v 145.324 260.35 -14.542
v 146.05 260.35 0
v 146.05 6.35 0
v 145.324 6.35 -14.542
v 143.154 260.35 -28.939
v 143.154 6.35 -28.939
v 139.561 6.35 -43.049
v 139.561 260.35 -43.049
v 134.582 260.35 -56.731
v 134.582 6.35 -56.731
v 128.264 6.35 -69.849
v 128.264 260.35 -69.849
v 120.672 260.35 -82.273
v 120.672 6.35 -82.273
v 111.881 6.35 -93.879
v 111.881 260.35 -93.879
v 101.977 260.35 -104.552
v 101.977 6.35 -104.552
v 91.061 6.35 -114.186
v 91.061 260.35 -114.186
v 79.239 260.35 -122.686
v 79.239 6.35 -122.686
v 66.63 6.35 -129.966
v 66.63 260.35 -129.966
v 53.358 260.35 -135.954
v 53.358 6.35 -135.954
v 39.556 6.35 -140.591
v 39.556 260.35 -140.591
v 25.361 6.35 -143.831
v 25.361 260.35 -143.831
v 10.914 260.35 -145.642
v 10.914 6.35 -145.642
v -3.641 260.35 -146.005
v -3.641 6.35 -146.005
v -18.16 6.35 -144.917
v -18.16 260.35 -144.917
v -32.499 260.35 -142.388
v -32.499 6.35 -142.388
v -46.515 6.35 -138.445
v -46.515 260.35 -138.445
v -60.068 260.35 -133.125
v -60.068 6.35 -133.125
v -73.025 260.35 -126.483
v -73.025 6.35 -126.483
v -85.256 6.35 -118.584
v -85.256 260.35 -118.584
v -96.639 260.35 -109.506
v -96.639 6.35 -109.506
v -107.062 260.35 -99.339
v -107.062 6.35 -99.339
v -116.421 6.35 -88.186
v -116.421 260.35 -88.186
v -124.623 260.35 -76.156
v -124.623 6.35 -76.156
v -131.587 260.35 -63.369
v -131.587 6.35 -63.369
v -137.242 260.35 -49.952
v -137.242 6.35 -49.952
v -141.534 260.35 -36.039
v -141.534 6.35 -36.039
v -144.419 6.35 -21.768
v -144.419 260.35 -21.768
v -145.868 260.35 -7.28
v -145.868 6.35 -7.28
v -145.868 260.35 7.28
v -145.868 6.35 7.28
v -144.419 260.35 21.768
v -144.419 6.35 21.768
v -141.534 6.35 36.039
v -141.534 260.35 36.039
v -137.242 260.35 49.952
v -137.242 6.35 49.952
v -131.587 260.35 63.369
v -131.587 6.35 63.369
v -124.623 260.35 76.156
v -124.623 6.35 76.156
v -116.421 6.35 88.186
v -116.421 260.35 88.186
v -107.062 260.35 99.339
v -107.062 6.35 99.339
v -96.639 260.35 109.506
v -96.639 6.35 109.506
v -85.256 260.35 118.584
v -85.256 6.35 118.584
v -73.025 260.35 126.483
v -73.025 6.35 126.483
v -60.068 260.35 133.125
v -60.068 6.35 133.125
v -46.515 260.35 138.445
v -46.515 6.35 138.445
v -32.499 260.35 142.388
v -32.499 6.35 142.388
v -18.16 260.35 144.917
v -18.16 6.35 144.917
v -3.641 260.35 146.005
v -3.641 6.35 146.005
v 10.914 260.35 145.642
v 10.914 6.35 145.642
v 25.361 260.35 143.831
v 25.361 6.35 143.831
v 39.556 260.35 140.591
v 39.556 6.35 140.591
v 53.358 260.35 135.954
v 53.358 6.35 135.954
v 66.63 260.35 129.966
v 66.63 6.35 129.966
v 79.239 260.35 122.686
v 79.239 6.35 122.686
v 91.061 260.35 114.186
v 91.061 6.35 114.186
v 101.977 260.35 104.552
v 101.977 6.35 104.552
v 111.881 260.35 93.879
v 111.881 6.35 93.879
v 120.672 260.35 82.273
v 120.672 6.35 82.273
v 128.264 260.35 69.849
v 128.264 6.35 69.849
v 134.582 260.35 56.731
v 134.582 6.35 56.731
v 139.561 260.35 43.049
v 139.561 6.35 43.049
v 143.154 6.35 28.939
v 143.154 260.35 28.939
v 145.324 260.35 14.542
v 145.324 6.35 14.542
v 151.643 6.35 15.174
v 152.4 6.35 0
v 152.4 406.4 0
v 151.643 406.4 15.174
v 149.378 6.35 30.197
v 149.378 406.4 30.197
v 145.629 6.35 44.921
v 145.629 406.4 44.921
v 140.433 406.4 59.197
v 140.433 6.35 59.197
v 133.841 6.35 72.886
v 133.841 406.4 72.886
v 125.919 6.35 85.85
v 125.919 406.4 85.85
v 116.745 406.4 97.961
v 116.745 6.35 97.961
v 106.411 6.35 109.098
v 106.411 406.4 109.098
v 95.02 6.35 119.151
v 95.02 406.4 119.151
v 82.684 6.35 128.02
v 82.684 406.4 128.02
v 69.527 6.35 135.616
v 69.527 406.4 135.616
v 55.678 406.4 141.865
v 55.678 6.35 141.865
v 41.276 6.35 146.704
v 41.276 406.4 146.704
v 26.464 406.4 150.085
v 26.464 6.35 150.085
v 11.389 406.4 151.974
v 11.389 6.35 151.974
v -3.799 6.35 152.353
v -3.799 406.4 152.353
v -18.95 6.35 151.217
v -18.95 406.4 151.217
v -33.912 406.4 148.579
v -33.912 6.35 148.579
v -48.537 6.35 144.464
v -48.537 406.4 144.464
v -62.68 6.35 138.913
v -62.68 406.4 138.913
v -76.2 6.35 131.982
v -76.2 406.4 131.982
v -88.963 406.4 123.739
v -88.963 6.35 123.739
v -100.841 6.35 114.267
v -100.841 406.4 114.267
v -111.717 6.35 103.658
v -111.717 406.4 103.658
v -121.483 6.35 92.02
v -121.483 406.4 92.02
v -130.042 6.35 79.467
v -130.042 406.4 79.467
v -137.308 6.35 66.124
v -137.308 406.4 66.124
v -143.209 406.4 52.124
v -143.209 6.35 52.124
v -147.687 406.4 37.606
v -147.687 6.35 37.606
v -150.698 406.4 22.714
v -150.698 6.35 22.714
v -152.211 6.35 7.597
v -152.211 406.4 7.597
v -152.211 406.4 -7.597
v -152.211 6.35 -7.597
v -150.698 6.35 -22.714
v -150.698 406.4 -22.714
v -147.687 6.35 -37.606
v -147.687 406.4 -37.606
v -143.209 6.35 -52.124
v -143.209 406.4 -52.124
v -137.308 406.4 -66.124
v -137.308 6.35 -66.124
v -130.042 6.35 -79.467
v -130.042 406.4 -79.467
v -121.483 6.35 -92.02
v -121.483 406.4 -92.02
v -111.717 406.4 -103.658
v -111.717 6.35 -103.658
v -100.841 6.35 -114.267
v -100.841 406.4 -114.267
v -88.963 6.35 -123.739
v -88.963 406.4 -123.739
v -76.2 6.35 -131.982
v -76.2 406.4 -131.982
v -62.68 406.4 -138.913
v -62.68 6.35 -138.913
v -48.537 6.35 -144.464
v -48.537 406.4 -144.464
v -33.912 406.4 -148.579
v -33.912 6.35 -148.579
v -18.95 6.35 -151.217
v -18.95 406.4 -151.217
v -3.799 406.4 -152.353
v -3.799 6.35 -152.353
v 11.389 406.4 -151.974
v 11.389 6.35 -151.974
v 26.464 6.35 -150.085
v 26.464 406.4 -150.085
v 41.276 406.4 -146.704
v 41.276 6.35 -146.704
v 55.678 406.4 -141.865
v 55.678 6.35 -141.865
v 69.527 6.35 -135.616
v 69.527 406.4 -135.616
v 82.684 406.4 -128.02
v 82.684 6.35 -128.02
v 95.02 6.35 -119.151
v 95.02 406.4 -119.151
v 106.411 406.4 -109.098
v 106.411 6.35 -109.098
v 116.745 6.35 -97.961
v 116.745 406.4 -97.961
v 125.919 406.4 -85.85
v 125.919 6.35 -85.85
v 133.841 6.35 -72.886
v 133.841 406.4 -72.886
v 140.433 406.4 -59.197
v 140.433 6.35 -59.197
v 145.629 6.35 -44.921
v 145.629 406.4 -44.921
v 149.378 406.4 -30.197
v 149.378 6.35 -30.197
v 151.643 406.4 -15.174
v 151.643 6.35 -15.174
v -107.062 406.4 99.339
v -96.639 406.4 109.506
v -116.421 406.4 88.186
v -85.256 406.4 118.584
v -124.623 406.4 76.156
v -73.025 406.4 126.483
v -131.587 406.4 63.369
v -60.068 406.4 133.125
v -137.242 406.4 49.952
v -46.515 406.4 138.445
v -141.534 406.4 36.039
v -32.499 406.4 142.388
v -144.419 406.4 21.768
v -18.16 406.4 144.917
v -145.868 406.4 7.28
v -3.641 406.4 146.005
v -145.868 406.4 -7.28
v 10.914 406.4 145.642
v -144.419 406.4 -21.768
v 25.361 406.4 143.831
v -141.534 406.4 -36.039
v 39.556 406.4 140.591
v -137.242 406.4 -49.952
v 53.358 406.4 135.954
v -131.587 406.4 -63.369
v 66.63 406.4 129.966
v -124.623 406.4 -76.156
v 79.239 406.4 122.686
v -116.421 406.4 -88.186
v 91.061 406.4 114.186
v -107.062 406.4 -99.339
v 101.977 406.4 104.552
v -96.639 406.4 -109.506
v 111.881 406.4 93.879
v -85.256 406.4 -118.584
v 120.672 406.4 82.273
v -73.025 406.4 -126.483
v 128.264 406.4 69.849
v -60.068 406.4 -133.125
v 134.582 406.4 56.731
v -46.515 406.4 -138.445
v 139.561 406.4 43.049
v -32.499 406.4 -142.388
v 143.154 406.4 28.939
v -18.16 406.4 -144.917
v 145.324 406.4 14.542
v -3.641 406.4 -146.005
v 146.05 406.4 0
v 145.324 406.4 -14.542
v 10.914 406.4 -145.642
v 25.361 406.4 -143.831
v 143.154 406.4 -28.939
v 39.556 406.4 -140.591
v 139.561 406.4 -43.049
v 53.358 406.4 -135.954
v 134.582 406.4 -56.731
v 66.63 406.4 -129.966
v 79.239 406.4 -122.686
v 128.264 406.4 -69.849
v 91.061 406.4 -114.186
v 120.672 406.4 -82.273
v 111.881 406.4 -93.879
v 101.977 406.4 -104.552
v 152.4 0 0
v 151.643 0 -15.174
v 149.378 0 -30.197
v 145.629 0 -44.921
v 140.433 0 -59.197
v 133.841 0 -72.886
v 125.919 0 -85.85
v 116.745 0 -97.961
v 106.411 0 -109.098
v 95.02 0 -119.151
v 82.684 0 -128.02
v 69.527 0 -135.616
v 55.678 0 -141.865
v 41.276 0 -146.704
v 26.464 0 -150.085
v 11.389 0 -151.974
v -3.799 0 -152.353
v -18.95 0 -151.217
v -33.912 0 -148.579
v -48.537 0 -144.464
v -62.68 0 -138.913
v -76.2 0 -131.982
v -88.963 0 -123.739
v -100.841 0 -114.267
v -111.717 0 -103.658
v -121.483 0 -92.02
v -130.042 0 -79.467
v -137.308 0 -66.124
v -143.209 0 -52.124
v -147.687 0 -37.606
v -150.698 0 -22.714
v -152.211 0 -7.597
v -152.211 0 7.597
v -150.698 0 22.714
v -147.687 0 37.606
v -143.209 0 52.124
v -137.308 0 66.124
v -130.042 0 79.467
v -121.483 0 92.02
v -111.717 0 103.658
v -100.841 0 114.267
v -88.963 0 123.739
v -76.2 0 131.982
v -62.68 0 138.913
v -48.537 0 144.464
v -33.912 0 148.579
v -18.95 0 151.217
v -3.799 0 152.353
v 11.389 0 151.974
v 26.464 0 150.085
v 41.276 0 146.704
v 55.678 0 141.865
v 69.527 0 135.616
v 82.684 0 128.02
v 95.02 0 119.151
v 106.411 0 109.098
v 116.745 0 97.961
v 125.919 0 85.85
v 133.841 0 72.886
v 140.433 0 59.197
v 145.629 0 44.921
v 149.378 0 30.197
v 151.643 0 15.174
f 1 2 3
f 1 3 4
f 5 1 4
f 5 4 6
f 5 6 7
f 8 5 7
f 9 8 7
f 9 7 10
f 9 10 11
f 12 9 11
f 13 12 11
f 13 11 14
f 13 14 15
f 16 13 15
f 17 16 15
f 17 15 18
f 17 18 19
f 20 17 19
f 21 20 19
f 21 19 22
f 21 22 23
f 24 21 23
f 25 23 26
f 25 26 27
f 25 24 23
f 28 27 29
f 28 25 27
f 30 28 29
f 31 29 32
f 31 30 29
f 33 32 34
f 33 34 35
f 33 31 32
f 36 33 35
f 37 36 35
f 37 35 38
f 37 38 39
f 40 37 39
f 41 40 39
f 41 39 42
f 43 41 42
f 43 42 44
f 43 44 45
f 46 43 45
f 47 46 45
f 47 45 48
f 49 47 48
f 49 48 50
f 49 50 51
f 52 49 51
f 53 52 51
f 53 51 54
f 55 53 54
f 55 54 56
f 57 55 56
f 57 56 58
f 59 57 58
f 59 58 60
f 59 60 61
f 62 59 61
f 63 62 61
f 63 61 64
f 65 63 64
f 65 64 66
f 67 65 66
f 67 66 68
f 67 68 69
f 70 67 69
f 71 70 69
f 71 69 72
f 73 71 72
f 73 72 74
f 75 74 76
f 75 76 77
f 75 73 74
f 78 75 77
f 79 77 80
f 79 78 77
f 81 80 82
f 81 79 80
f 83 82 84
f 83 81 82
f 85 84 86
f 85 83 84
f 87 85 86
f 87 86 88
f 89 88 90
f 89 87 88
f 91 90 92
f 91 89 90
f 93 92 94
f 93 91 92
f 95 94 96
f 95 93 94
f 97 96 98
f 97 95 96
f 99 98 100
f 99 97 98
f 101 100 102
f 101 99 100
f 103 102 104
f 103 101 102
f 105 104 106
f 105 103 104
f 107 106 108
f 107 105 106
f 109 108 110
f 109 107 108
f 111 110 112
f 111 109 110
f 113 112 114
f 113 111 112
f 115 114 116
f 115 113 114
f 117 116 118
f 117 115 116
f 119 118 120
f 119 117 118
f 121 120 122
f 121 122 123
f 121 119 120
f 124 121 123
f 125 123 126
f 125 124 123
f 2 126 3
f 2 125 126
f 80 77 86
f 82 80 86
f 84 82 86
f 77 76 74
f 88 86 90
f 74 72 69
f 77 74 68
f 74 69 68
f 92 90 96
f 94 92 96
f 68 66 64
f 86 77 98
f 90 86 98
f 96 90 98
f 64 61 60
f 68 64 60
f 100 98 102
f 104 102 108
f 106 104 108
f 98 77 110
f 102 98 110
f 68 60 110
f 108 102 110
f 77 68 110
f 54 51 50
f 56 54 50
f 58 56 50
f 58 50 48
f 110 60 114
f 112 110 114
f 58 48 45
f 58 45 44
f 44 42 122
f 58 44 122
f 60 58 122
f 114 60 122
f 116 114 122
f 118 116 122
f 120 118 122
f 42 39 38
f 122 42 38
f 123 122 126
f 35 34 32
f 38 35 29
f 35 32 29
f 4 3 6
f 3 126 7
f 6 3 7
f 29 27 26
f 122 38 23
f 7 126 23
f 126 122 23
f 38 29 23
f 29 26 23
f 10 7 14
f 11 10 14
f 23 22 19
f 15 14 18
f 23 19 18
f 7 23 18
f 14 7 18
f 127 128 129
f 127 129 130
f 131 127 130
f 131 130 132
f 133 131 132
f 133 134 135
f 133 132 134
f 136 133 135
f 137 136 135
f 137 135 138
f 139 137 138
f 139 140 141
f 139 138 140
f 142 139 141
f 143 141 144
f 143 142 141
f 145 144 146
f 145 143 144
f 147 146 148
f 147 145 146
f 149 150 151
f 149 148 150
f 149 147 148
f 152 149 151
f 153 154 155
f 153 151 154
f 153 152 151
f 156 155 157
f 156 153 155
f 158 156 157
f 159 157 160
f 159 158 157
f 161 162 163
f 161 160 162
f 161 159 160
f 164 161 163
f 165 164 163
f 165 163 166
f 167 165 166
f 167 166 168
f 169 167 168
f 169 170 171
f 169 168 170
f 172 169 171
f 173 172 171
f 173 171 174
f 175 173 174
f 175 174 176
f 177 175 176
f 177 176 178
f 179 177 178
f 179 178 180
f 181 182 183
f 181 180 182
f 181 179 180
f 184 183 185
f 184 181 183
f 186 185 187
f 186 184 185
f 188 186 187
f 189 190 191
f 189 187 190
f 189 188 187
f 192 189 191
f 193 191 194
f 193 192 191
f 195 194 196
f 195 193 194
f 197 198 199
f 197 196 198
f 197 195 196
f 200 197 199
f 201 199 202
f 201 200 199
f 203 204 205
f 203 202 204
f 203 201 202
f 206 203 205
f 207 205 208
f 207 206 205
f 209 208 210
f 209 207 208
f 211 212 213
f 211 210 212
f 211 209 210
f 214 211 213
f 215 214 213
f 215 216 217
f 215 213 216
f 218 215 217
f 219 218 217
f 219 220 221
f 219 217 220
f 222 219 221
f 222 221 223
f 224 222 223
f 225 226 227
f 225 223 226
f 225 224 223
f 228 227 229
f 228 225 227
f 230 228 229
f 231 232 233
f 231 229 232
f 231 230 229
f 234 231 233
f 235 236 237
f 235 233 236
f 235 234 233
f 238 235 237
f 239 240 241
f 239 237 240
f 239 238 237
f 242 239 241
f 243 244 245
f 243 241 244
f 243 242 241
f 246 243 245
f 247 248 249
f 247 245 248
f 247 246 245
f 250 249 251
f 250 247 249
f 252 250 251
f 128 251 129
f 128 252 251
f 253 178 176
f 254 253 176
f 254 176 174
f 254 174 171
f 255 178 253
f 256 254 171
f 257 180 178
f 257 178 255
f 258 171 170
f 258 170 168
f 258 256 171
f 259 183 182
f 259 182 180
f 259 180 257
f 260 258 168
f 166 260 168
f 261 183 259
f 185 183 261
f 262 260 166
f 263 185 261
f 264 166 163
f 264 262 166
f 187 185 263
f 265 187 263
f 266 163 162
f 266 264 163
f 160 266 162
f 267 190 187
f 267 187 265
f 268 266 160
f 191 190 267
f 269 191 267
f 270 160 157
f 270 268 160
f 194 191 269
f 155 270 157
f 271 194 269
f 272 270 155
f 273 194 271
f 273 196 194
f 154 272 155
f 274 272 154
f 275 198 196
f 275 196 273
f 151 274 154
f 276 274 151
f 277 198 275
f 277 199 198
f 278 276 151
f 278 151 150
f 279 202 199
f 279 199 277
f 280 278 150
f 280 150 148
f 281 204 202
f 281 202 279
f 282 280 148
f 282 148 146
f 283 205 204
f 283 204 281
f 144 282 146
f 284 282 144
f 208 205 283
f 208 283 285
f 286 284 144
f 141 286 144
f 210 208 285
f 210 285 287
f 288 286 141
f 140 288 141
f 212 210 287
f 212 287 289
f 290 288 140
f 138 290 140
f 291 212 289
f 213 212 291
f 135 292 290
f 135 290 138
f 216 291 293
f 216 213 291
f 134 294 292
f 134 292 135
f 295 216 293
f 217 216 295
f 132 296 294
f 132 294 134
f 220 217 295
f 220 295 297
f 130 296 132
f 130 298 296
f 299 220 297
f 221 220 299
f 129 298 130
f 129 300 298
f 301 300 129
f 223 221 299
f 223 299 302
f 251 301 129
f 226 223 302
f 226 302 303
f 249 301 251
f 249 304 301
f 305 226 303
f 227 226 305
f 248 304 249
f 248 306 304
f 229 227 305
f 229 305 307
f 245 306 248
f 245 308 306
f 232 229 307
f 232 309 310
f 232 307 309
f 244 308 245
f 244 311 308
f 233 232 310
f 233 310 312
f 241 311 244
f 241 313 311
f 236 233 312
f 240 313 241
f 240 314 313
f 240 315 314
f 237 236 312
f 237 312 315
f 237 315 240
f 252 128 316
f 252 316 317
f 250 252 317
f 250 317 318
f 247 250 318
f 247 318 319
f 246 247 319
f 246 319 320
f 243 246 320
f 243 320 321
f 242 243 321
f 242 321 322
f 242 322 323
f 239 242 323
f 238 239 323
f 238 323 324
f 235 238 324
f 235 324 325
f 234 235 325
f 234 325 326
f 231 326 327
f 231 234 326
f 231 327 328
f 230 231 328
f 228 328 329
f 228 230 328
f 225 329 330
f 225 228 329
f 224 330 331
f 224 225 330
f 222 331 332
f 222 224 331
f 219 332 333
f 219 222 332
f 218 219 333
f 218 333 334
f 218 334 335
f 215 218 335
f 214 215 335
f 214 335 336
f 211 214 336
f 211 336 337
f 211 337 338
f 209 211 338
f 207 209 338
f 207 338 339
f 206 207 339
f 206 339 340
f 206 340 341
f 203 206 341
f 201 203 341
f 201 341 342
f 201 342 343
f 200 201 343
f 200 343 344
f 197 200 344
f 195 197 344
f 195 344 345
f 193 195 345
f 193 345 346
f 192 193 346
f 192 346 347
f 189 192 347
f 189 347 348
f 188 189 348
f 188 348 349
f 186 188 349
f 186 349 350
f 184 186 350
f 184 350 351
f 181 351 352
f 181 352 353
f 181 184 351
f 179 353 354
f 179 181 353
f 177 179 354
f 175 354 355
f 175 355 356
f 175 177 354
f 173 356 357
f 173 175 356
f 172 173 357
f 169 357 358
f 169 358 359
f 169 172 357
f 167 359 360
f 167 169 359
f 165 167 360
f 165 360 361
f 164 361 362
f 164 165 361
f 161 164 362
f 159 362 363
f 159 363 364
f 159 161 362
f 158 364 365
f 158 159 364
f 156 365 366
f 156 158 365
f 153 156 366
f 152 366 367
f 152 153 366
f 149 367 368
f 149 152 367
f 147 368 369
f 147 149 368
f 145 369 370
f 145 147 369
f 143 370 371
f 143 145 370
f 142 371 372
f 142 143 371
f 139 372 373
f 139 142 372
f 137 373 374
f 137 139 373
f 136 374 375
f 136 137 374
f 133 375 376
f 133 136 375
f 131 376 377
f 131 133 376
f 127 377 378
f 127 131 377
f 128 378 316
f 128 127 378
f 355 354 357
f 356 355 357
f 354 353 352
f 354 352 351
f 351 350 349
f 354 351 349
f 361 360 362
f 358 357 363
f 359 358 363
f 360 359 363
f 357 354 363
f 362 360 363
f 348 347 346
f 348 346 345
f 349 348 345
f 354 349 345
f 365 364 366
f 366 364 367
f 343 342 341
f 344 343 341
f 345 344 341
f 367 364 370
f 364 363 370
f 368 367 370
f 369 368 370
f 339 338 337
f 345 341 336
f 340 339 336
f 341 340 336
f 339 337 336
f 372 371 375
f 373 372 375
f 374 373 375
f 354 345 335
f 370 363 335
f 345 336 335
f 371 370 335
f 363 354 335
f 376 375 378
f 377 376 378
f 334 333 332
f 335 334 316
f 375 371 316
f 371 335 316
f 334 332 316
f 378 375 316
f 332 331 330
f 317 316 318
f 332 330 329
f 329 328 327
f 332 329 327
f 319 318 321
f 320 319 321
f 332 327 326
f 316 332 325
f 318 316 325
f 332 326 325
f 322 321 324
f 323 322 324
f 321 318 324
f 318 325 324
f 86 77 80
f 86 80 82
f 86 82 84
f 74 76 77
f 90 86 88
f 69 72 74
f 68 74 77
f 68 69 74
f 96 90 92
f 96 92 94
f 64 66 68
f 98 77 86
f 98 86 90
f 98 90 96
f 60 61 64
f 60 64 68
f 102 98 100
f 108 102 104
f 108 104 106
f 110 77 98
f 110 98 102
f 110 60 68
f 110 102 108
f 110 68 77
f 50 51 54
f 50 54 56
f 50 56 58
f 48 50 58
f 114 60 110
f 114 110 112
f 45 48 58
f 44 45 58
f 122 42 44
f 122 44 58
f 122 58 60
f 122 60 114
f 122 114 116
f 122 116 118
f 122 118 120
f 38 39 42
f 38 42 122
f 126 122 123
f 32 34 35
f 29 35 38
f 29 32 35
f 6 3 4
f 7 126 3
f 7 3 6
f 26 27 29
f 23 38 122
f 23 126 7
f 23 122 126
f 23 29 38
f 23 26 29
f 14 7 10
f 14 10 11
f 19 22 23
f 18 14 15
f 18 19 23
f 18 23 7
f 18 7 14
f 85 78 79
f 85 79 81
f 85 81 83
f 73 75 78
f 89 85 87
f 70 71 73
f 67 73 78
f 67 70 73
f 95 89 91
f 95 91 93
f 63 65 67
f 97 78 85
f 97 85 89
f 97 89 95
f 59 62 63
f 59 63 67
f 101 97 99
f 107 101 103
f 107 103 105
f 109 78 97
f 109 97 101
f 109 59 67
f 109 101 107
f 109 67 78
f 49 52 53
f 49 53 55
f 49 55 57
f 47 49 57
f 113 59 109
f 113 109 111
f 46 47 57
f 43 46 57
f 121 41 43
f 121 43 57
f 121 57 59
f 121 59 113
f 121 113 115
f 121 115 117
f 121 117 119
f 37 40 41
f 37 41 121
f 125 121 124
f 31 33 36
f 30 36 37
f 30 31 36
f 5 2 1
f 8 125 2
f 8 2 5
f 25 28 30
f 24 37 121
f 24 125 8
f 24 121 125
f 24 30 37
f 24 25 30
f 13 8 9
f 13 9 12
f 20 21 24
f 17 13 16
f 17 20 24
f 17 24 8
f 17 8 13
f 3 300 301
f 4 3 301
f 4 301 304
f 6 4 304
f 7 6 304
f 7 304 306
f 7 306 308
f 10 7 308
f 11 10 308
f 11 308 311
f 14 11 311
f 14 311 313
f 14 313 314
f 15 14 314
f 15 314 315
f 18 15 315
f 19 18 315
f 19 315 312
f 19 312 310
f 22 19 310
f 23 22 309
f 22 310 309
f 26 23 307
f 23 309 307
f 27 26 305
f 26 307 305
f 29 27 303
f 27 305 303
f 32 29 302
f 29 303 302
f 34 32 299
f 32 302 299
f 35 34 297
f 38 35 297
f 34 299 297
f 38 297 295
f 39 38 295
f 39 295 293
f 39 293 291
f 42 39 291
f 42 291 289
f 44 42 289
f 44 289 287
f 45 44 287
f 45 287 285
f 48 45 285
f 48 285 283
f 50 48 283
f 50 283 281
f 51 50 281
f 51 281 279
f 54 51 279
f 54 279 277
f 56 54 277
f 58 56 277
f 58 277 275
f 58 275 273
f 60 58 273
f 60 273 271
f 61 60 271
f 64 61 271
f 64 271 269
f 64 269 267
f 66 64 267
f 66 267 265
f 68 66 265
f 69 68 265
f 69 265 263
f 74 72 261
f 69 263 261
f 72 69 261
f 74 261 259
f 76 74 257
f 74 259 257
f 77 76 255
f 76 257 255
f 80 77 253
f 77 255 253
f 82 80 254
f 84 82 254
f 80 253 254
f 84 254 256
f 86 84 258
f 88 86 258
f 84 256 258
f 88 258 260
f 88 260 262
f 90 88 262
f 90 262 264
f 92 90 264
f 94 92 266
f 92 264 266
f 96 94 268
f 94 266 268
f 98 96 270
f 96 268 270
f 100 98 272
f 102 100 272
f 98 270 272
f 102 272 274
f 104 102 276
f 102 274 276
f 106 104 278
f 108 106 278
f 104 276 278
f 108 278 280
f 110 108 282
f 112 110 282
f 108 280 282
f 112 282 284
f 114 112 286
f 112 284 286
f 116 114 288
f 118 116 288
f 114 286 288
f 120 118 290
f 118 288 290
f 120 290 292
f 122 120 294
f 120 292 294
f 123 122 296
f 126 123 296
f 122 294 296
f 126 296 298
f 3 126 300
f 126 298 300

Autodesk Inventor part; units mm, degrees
ref_plane "YZ Plane" through (0, 0, 0) normal (1, 0, 0) x (0, 1, 0)
ref_plane "XZ Plane" through (0, 0, 0) normal (0, 1, 0) x (-1, 0, 0)
ref_plane "XY Plane" through (0, 0, 0) normal (0, 0, 1) x (1, 0, 0)
sketch "Sketch1" plane through (0, 0, 0) normal (0, 0, 1) x (1, 0, 0)
  line L0 (-30.48, 0) -> (182.88, 0) construction
  line L1 (0, -81.28) -> (0, 487.68) construction
  line L2 (146.05, 406.4) -> (152.4, 406.4)
  line L3 (152.4, 406.4) -> (152.4, 6.35)
  line L4 (152.4, 6.35) -> (146.05, 6.35)
  line L5 (146.05, 6.35) -> (146.05, 406.4)
  line L6 (0, 0) -> (152.4, 0)
  line L7 (152.4, 0) -> (152.4, 6.35)
  line L8 (152.4, 6.35) -> (0, 6.35)
  line L9 (0, 6.35) -> (0, 0)
  line L10 (0, 260.35) -> (146.05, 260.35)
  line L11 (146.05, 260.35) -> (146.05, 6.35)
  line L12 (146.05, 6.35) -> (0, 6.35)
  line L13 (0, 6.35) -> (0, 260.35)
  point P0 (146.05, 6.35)
  point P1 (0, 6.35)
  point P2 (146.05, 260.35)
  dimension "d0" = 152.4
  dimension "d1" = 406.4
  dimension "d2" = 6.35
  dimension "d3" = 254
revolve "Revolution1" add sketch "Sketch1" angle 360 about axis through (0, 6.35, 0) along (0, 1, 0) contours L2 L3 L4 L5 | L7 L6 L9 L8 L4
revolve "Revolution2" add sketch "Sketch1" angle 360 about axis through (0, -10, 0) along (0, 1, 0) separate body contours L5 L8 L13 L10
equation "\"d0\" = 0.5 * BaseDia"
equation "\"d1\" = Height"
equation "\"d2\" = Thickness"
equation "\"d3\" = LiquidDepth"
equation "\"BaseDia\" = 304.8"
equation "\"Height\" = 406.4"
equation "\"Thickness\" = 6.35"
equation "\"LiquidDepth\" = 254"
properties part number "water-tank-sizing-by-calcslive-plug"
